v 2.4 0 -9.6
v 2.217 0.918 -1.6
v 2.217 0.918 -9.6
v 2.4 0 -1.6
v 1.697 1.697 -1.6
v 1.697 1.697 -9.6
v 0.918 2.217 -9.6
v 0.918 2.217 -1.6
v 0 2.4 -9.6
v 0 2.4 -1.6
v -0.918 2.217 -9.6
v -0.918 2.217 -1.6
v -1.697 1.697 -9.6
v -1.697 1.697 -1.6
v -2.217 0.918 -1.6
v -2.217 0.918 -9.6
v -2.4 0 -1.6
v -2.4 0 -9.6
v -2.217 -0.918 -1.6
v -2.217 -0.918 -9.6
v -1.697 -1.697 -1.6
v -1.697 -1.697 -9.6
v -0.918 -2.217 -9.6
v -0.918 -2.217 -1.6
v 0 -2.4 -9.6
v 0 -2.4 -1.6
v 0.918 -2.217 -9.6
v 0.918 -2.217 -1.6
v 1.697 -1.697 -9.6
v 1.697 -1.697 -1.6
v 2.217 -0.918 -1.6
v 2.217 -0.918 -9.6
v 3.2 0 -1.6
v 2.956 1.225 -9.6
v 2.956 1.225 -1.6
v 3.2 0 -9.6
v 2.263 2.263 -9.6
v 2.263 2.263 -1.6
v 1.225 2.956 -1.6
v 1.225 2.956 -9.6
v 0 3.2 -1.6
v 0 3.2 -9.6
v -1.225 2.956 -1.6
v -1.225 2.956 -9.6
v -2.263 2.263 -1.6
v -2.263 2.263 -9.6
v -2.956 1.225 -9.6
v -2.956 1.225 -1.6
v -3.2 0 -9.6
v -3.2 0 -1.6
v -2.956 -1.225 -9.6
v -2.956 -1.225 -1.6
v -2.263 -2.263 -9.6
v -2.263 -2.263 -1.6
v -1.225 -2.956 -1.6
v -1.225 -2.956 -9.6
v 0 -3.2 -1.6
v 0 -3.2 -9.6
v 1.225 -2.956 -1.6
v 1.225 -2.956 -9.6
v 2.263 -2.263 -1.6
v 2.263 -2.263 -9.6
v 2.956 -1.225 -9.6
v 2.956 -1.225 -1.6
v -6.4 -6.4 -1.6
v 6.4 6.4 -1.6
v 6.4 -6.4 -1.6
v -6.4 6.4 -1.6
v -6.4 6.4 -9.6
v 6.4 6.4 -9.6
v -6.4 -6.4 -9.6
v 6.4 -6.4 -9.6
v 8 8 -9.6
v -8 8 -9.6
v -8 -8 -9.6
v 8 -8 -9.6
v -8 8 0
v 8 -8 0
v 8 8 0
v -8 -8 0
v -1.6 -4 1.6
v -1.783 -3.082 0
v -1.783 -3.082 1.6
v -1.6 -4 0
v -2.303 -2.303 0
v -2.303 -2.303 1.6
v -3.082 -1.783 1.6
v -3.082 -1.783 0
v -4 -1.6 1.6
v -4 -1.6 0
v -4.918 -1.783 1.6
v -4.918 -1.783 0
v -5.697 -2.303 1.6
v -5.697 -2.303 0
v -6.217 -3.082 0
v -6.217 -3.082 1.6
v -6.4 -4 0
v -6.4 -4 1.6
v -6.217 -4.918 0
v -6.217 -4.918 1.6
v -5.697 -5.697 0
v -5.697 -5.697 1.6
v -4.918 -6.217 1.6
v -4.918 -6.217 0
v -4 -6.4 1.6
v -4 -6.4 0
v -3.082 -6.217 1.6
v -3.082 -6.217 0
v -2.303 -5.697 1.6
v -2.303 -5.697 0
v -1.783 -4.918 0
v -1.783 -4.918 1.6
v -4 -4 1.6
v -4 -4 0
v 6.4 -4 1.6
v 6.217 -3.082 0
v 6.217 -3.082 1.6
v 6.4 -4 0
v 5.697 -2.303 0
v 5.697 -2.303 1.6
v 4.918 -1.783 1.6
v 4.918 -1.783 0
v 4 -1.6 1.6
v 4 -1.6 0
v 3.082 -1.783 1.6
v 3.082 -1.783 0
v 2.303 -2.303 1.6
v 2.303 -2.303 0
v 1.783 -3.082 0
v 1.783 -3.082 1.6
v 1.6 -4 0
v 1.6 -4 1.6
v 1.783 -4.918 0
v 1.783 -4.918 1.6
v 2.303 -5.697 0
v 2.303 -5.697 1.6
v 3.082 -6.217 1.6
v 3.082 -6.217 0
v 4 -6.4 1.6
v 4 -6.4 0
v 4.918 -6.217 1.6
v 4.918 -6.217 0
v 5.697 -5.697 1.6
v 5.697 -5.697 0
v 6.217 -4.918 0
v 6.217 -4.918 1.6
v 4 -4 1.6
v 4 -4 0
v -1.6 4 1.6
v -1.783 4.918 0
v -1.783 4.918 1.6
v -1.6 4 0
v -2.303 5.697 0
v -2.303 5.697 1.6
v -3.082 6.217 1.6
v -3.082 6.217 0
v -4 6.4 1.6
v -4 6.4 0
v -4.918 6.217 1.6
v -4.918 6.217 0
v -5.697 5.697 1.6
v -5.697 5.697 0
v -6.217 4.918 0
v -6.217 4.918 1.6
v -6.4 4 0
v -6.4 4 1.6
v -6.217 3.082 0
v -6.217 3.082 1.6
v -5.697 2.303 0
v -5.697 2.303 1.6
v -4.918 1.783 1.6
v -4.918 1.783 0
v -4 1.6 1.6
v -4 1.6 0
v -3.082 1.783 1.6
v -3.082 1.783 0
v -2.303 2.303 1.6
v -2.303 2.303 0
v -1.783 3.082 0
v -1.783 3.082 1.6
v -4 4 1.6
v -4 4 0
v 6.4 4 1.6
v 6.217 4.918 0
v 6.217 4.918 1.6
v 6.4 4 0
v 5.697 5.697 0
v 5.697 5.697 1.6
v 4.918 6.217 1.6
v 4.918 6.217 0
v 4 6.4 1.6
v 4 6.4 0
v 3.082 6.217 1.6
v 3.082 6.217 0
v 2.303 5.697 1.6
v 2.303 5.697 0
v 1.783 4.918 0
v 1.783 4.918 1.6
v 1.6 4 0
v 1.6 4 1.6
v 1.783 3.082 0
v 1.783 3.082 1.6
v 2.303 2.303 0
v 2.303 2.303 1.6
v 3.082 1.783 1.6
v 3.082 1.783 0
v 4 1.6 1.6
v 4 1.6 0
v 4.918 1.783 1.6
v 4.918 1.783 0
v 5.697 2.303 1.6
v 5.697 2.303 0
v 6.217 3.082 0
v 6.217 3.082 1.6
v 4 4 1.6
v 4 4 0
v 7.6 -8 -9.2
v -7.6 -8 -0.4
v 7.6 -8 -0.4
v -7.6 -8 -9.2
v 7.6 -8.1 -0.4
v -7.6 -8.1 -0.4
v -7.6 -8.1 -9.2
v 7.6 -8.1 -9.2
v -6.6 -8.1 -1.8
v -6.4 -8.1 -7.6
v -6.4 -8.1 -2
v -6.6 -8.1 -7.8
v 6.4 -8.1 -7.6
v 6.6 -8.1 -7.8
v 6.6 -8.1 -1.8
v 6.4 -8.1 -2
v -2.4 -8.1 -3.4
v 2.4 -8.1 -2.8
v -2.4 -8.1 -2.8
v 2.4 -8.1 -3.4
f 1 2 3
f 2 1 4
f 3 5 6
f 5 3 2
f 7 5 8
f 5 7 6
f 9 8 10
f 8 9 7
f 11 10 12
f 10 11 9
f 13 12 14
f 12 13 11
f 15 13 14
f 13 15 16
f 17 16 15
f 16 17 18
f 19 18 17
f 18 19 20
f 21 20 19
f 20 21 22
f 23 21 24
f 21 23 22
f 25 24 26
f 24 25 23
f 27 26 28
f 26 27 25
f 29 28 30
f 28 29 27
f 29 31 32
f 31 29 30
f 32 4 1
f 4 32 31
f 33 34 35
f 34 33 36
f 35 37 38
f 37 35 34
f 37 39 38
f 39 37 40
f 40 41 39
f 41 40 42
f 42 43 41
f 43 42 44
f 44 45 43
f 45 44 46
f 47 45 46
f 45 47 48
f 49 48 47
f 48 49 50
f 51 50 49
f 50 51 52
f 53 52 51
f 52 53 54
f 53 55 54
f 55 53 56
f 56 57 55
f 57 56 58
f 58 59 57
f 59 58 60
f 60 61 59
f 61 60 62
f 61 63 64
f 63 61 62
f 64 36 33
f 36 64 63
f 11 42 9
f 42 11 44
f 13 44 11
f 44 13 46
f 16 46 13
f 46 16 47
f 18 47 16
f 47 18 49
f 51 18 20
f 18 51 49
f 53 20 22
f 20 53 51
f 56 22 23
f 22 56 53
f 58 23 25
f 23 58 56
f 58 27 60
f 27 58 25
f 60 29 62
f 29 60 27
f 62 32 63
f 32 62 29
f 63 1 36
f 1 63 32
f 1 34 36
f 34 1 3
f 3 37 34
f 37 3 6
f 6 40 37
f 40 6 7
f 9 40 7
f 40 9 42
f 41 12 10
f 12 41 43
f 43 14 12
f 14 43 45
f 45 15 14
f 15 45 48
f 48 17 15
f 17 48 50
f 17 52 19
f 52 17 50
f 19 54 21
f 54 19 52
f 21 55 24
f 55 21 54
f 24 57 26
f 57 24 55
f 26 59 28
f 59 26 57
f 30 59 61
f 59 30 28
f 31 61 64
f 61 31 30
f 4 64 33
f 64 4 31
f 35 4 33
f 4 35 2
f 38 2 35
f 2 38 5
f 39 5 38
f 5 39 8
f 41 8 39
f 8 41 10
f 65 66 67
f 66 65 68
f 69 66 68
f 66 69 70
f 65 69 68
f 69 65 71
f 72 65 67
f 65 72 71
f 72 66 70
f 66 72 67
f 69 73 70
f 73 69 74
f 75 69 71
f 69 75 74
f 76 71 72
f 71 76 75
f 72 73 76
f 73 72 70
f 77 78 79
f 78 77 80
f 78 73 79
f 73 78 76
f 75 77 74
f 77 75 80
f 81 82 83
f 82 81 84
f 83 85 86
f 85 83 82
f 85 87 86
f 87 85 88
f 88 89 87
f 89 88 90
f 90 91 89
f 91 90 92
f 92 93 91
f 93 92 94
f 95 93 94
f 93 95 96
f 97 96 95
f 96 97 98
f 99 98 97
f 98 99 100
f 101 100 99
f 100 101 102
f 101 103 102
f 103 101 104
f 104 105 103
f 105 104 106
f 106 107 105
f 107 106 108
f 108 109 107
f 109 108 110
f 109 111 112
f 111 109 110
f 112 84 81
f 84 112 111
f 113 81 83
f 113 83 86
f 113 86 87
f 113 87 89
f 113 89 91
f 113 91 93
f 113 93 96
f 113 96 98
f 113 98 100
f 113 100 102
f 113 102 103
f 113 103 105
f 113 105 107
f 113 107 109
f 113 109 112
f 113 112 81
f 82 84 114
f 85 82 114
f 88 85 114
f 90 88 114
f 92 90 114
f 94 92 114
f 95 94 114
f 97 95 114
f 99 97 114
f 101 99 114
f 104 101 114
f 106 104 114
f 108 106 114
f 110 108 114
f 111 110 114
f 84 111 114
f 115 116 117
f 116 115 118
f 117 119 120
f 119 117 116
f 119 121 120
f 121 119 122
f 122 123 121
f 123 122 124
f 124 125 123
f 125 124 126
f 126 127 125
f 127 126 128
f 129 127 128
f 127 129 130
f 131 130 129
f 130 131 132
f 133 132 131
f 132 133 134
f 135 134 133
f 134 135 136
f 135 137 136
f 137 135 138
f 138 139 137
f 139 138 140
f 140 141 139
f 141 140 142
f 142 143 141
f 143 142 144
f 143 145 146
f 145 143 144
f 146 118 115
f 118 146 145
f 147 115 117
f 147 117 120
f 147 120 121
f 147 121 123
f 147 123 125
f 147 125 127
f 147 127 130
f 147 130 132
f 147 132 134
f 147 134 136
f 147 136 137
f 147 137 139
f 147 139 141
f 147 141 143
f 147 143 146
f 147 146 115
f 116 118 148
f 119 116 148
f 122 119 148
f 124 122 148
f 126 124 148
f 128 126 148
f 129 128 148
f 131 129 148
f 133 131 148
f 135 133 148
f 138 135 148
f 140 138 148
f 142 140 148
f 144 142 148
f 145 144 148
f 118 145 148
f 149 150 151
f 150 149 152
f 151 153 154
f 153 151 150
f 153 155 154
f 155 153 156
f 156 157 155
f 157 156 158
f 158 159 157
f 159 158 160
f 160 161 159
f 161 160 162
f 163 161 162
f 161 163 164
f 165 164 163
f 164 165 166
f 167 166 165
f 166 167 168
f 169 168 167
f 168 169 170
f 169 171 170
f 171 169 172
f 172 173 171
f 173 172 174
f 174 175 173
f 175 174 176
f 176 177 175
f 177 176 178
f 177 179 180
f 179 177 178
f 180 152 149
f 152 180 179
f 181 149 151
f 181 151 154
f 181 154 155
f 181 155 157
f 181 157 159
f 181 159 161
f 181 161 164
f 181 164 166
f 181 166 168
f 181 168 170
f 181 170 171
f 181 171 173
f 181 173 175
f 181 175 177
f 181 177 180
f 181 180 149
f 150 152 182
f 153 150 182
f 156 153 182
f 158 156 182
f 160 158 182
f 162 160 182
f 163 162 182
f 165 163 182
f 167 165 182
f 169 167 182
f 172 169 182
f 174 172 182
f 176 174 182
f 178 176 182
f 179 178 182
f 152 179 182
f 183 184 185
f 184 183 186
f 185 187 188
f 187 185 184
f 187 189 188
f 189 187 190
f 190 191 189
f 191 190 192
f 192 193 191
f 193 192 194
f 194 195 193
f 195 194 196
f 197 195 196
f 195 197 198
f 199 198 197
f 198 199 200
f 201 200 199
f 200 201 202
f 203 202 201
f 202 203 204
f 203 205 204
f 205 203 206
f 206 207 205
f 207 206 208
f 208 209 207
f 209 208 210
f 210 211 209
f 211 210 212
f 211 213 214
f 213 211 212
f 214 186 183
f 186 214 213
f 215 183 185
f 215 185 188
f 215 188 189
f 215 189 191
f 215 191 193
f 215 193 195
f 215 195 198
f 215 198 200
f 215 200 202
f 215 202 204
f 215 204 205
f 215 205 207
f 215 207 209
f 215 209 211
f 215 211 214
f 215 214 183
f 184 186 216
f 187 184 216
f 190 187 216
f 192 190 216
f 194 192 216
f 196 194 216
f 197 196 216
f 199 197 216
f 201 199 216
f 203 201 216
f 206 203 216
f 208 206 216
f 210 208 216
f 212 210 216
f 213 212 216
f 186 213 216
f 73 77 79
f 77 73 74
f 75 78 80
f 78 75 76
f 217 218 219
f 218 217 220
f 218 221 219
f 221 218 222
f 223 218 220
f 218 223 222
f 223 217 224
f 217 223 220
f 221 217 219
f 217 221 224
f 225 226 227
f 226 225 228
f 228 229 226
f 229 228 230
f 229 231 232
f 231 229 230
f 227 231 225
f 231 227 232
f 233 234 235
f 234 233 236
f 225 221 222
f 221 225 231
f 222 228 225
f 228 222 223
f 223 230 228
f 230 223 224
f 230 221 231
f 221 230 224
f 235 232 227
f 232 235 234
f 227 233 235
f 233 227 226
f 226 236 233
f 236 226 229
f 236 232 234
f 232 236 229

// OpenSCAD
// file: ../p/4-4disc.scad
use <../lib.scad>
function ldraw_lib__4_4disc() = [
// 0 Disc 1.0
// 0 Name: 4-4disc.dat
// 0 Author: James Jessiman
// 0 !LDRAW_ORG Primitive UPDATE 2002-02
// 0 !LICENSE Licensed under CC BY 2.0 and CC BY 4.0 : see CAreadme.txt
// 
// 0 BFC CERTIFY CCW
  [0,"BFC","CERTIFY"],
  [0,"BFC","CCW"],
// 
// 0 !HISTORY 1998-12-15 [PTadmin] Official Update 1998-10
// 0 !HISTORY 2002-03-23 [sbliss] Added BFC statement
// 0 !HISTORY 2002-04-25 [PTadmin] Official Update 2002-02
// 0 !HISTORY 2007-06-24 [PTadmin] Header formatted for Contributor Agreement
// 0 !HISTORY 2008-07-01 [PTadmin] Official Update 2008-01
// 
// 
// 3 16 0 0 0 1 0 0 0.9239 0 0.3827
  [3,16,0,0,0,1,0,0,0.9239,0,0.3827],
// 3 16 0 0 0 0.9239 0 0.3827 0.7071 0 0.7071
  [3,16,0,0,0,0.9239,0,0.3827,0.7071,0,0.7071],
// 3 16 0 0 0 0.7071 0 0.7071 0.3827 0 0.9239
  [3,16,0,0,0,0.7071,0,0.7071,0.3827,0,0.9239],
// 3 16 0 0 0 0.3827 0 0.9239 0 0 1
  [3,16,0,0,0,0.3827,0,0.9239,0,0,1],
// 3 16 0 0 0 0 0 1 -0.3827 0 0.9239
  [3,16,0,0,0,0,0,1,-0.3827,0,0.9239],
// 3 16 0 0 0 -0.3827 0 0.9239 -0.7071 0 0.7071
  [3,16,0,0,0,-0.3827,0,0.9239,-0.7071,0,0.7071],
// 3 16 0 0 0 -0.7071 0 0.7071 -0.9239 0 0.3827
  [3,16,0,0,0,-0.7071,0,0.7071,-0.9239,0,0.3827],
// 3 16 0 0 0 -0.9239 0 0.3827 -1 0 -0
  [3,16,0,0,0,-0.9239,0,0.3827,-1,0,-0],
// 3 16 0 0 0 -1 0 -0 -0.9239 0 -0.3827
  [3,16,0,0,0,-1,0,-0,-0.9239,0,-0.3827],
// 3 16 0 0 0 -0.9239 0 -0.3827 -0.7071 0 -0.7071
  [3,16,0,0,0,-0.9239,0,-0.3827,-0.7071,0,-0.7071],
// 3 16 0 0 0 -0.7071 0 -0.7071 -0.3827 0 -0.9239
  [3,16,0,0,0,-0.7071,0,-0.7071,-0.3827,0,-0.9239],
// 3 16 0 0 0 -0.3827 0 -0.9239 0 0 -1
  [3,16,0,0,0,-0.3827,0,-0.9239,0,0,-1],
// 3 16 0 0 0 0 0 -1 0.3827 0 -0.9239
  [3,16,0,0,0,0,0,-1,0.3827,0,-0.9239],
// 3 16 0 0 0 0.3827 0 -0.9239 0.7071 0 -0.7071
  [3,16,0,0,0,0.3827,0,-0.9239,0.7071,0,-0.7071],
// 3 16 0 0 0 0.7071 0 -0.7071 0.9239 0 -0.3827
  [3,16,0,0,0,0.7071,0,-0.7071,0.9239,0,-0.3827],
// 3 16 0 0 0 0.9239 0 -0.3827 1 0 0
  [3,16,0,0,0,0.9239,0,-0.3827,1,0,0],
// 0
];
module ldraw_lib__4_4disc(step=0, col=false, unit=2/5, alt=false, line=0.2, solid=!$preview)
    makepoly(ldraw_lib__4_4disc(), step=step, col=col, unit=unit, alt=alt, line=line, solid=solid);
ldraw_lib__4_4disc(line=0.2);
// file: ../p/stud.scad
use <../lib.scad>
use <4-4cyli.scad>
use <4-4disc.scad>
use <4-4edge.scad>
function ldraw_lib__stud() = [
// 0 Stud
// 0 Name: stud.dat
// 0 Author: James Jessiman
// 0 !LDRAW_ORG Primitive UPDATE 2012-01
// 0 !LICENSE Licensed under CC BY 4.0 : see CAreadme.txt
// 
// 0 BFC CERTIFY CCW
  [0,"BFC","CERTIFY"],
  [0,"BFC","CCW"],
// 
// 0 !HISTORY 2002-04-04 [sbliss] Modified for BFC compliance
// 0 !HISTORY 2002-04-25 [PTadmin] Official Update 2002-02
// 0 !HISTORY 2007-06-24 [PTadmin] Header formatted for Contributor Agreement
// 0 !HISTORY 2008-07-01 [PTadmin] Official Update 2008-01
// 0 !HISTORY 2012-02-16 [Philo] Changed to CCW
// 0 !HISTORY 2012-03-30 [PTadmin] Official Update 2012-01
// 
// 
// 1 16 0 0 0 6 0 0 0 1 0 0 0 6 4-4edge.dat
  [1,16,0,0,0,6,0,0,0,1,0,0,0,6, ldraw_lib__4_4edge()],
// 1 16 0 -4 0 6 0 0 0 1 0 0 0 6 4-4edge.dat
  [1,16,0,-4,0,6,0,0,0,1,0,0,0,6, ldraw_lib__4_4edge()],
// 1 16 0 0 0 6 0 0 0 -4 0 0 0 6 4-4cyli.dat
  [1,16,0,0,0,6,0,0,0,-4,0,0,0,6, ldraw_lib__4_4cyli()],
// 1 16 0 -4 0 6 0 0 0 1 0 0 0 6 4-4disc.dat
  [1,16,0,-4,0,6,0,0,0,1,0,0,0,6, ldraw_lib__4_4disc()],
  [-1,16,0,0,0,6,0,0,0,-1,0,0,0,6, ldraw_lib__4_4disc()],
];
module ldraw_lib__stud(step=0, col=false, unit=2/5, alt=false, line=0.2, solid=!$preview)
    makepoly(ldraw_lib__stud(), step=step, col=col, unit=unit, alt=alt, line=line, solid=solid);
ldraw_lib__stud(line=0.2);
// file: ../p/4-4ring3.scad
use <../lib.scad>
$fa=1; $fs=0.2;
function ldraw_lib__4_4ring3(realsolid=false) = [
// 0 Ring  3 x 1.0
// 0 Name: 4-4ring3.dat
// 0 Author: James Jessiman
// 0 !LDRAW_ORG Primitive UPDATE 2009-01
// 0 !LICENSE Licensed under CC BY 2.0 and CC BY 4.0 : see CAreadme.txt
// 
// 0 BFC CERTIFY CCW
  [0,"BFC","CERTIFY"],
  [0,"BFC","CCW"],
// 
// 0 !HISTORY 1998-12-15 [PTadmin] Official Update 1998-10
// 0 !HISTORY 2002-04-05 [hafhead] Added BFC statement
// 0 !HISTORY 2002-04-25 [PTadmin] Official Update 2002-02
// 0 !HISTORY 2007-06-24 [PTadmin] Header formatted for Contributor Agreement
// 0 !HISTORY 2008-07-01 [PTadmin] Official Update 2008-01
// 0 !HISTORY 2008-08-26 [cwdee] Switch polygon winding and rename
// 0 !HISTORY 2009-05-02 [PTadmin] Official Update 2009-01
// 
// 
// 4 16 -1.5308 0 3.6956 -1.1481 0 2.7717 0 0 3 0 0 4
  [4,16,-1.5308,0,3.6956,-1.1481,0,2.7717,0,0,3,0,0,4],
// 4 16 -2.8284 0 2.8284 -2.1213 0 2.1213 -1.1481 0 2.7717 -1.5308 0 3.6956
  [4,16,-2.8284,0,2.8284,-2.1213,0,2.1213,-1.1481,0,2.7717,-1.5308,0,3.6956],
// 4 16 -3.6956 0 1.5308 -2.7717 0 1.1481 -2.1213 0 2.1213 -2.8284 0 2.8284
  [4,16,-3.6956,0,1.5308,-2.7717,0,1.1481,-2.1213,0,2.1213,-2.8284,0,2.8284],
// 4 16 -4 0 0 -3 0 0 -2.7717 0 1.1481 -3.6956 0 1.5308
  [4,16,-4,0,0,-3,0,0,-2.7717,0,1.1481,-3.6956,0,1.5308],
// 4 16 -3.6956 0 -1.5308 -2.7717 0 -1.1481 -3 0 0 -4 0 0
  [4,16,-3.6956,0,-1.5308,-2.7717,0,-1.1481,-3,0,0,-4,0,0],
// 4 16 -2.8284 0 -2.8284 -2.1213 0 -2.1213 -2.7717 0 -1.1481 -3.6956 0 -1.5308
  [4,16,-2.8284,0,-2.8284,-2.1213,0,-2.1213,-2.7717,0,-1.1481,-3.6956,0,-1.5308],
// 4 16 -1.5308 0 -3.6956 -1.1481 0 -2.7717 -2.1213 0 -2.1213 -2.8284 0 -2.8284
  [4,16,-1.5308,0,-3.6956,-1.1481,0,-2.7717,-2.1213,0,-2.1213,-2.8284,0,-2.8284],
// 4 16 0 0 -4 0 0 -3 -1.1481 0 -2.7717 -1.5308 0 -3.6956
  [4,16,0,0,-4,0,0,-3,-1.1481,0,-2.7717,-1.5308,0,-3.6956],
// 4 16 1.5308 0 -3.6956 1.1481 0 -2.7717 0 0 -3 0 0 -4
  [4,16,1.5308,0,-3.6956,1.1481,0,-2.7717,0,0,-3,0,0,-4],
// 4 16 2.8284 0 -2.8284 2.1213 0 -2.1213 1.1481 0 -2.7717 1.5308 0 -3.6956
  [4,16,2.8284,0,-2.8284,2.1213,0,-2.1213,1.1481,0,-2.7717,1.5308,0,-3.6956],
// 4 16 3.6956 0 -1.5308 2.7717 0 -1.1481 2.1213 0 -2.1213 2.8284 0 -2.8284
  [4,16,3.6956,0,-1.5308,2.7717,0,-1.1481,2.1213,0,-2.1213,2.8284,0,-2.8284],
// 4 16 4 0 0 3 0 0 2.7717 0 -1.1481 3.6956 0 -1.5308
  [4,16,4,0,0,3,0,0,2.7717,0,-1.1481,3.6956,0,-1.5308],
// 4 16 3.6956 0 1.5308 2.7717 0 1.1481 3 0 0 4 0 0
  [4,16,3.6956,0,1.5308,2.7717,0,1.1481,3,0,0,4,0,0],
// 4 16 2.8284 0 2.8284 2.1213 0 2.1213 2.7717 0 1.1481 3.6956 0 1.5308
  [4,16,2.8284,0,2.8284,2.1213,0,2.1213,2.7717,0,1.1481,3.6956,0,1.5308],
// 4 16 1.5308 0 3.6956 1.1481 0 2.7717 2.1213 0 2.1213 2.8284 0 2.8284
  [4,16,1.5308,0,3.6956,1.1481,0,2.7717,2.1213,0,2.1213,2.8284,0,2.8284],
// 4 16 0 0 4 0 0 3 1.1481 0 2.7717 1.5308 0 3.6956
  [4,16,0,0,4,0,0,3,1.1481,0,2.7717,1.5308,0,3.6956],
// 0
];
module ldraw_lib__4_4ring3(step=0, col=false, unit=2/5, alt=false, line=0.2, solid=!$preview)
    makepoly(ldraw_lib__4_4ring3(solid), step=step, col=col, unit=unit, alt=alt, line=line, solid=solid);
ldraw_lib__4_4ring3(line=0.2);
// file: ../p/4-4edge.scad
use <../lib.scad>
function ldraw_lib__4_4edge() = [
// 0 Circle 1.0
// 0 Name: 4-4edge.dat
// 0 Author: James Jessiman
// 0 !LDRAW_ORG Primitive UPDATE 2017-01
// 0 !LICENSE Licensed under CC BY 2.0 and CC BY 4.0 : see CAreadme.txt
// 
// 0 BFC CERTIFY CCW
  [0,"BFC","CERTIFY"],
  [0,"BFC","CCW"],
// 
// 0 !HISTORY 1998-12-15 [PTadmin] Official Update 1998-10
// 0 !HISTORY 2005-12-28 [PTadmin] Official Update 2005-01
// 0 !HISTORY 2007-06-24 [PTadmin] Header formatted for Contributor Agreement
// 0 !HISTORY 2008-07-01 [PTadmin] Official Update 2008-01
// 0 !HISTORY 2017-01-15 [Steffen] BFCed
// 0 !HISTORY 2017-12-30 [PTadmin] Official Update 2017-01
// 
// 
// 2 24 1 0 0 0.9239 0 0.3827
  [2,24,1,0,0,0.9239,0,0.3827],
// 2 24 0.9239 0 0.3827 0.7071 0 0.7071
  [2,24,0.9239,0,0.3827,0.7071,0,0.7071],
// 2 24 0.7071 0 0.7071 0.3827 0 0.9239
  [2,24,0.7071,0,0.7071,0.3827,0,0.9239],
// 2 24 0.3827 0 0.9239 0 0 1
  [2,24,0.3827,0,0.9239,0,0,1],
// 2 24 0 0 1 -0.3827 0 0.9239
  [2,24,0,0,1,-0.3827,0,0.9239],
// 2 24 -0.3827 0 0.9239 -0.7071 0 0.7071
  [2,24,-0.3827,0,0.9239,-0.7071,0,0.7071],
// 2 24 -0.7071 0 0.7071 -0.9239 0 0.3827
  [2,24,-0.7071,0,0.7071,-0.9239,0,0.3827],
// 2 24 -0.9239 0 0.3827 -1 0 -0
  [2,24,-0.9239,0,0.3827,-1,0,-0],
// 2 24 -1 0 -0 -0.9239 0 -0.3827
  [2,24,-1,0,-0,-0.9239,0,-0.3827],
// 2 24 -0.9239 0 -0.3827 -0.7071 0 -0.7071
  [2,24,-0.9239,0,-0.3827,-0.7071,0,-0.7071],
// 2 24 -0.7071 0 -0.7071 -0.3827 0 -0.9239
  [2,24,-0.7071,0,-0.7071,-0.3827,0,-0.9239],
// 2 24 -0.3827 0 -0.9239 0 0 -1
  [2,24,-0.3827,0,-0.9239,0,0,-1],
// 2 24 0 0 -1 0.3827 0 -0.9239
  [2,24,0,0,-1,0.3827,0,-0.9239],
// 2 24 0.3827 0 -0.9239 0.7071 0 -0.7071
  [2,24,0.3827,0,-0.9239,0.7071,0,-0.7071],
// 2 24 0.7071 0 -0.7071 0.9239 0 -0.3827
  [2,24,0.7071,0,-0.7071,0.9239,0,-0.3827],
// 2 24 0.9239 0 -0.3827 1 0 0
  [2,24,0.9239,0,-0.3827,1,0,0],
];
module ldraw_lib__4_4edge(step=0, col=false, unit=2/5, alt=false, line=0.2, solid=!$preview)
    makepoly(ldraw_lib__4_4edge(), step=step, col=col, unit=unit, alt=alt, line=line, solid=solid);
ldraw_lib__4_4edge(line=0.2);
// file: ../p/4-4cyli.scad
use <../lib.scad>
$fa=1; $fs=0.2;
function ldraw_lib__4_4cyli(realsolid=false) = [
// 0 Cylinder 1.0
// 0 Name: 4-4cyli.dat
// 0 Author: James Jessiman
// 0 !LDRAW_ORG Primitive UPDATE 2005-01
// 0 !LICENSE Licensed under CC BY 2.0 and CC BY 4.0 : see CAreadme.txt
// 
// 0 BFC CERTIFY CCW
  [0,"BFC","CERTIFY"],
  [0,"BFC","CCW"],
// 
// 0 !HISTORY 1998-12-15 [PTadmin] Official Update 1998-10
// 0 !HISTORY 2002-03-23 [sbliss] Added BFC statement; merged headers from files in distributions LDraw 0.27 and Complete.
// 0 !HISTORY 2002-04-25 [PTadmin] Official Update 2002-02
// 0 !HISTORY 2004-12-14 [guyvivan] BFC CCW
// 0 !HISTORY 2005-12-28 [PTadmin] Official Update 2005-01
// 0 !HISTORY 2007-06-24 [PTadmin] Header formatted for Contributor Agreement
// 0 !HISTORY 2008-07-01 [PTadmin] Official Update 2008-01
// 
// 
// 4 16 1 1 0 0.9239 1 0.3827 0.9239 0 0.3827 1 0 0
  [4,16,1,1,0,0.9239,1,0.3827,0.9239,0,0.3827,1,0,0],
// 5 24 1 0 0 1 1 0 0.9239 0 0.3827 0.9239 0 -0.3827
  [5,24,1,0,0,1,1,0,0.9239,0,0.3827,0.9239,0,-0.3827],
// 4 16 0.9239 1 0.3827 0.7071 1 0.7071 0.7071 0 0.7071 0.9239 0 0.3827
  [4,16,0.9239,1,0.3827,0.7071,1,0.7071,0.7071,0,0.7071,0.9239,0,0.3827],
// 5 24 0.9239 0 0.3827 0.9239 1 0.3827 0.7071 0 0.7071 1 0 0
  [5,24,0.9239,0,0.3827,0.9239,1,0.3827,0.7071,0,0.7071,1,0,0],
// 4 16 0.7071 1 0.7071 0.3827 1 0.9239 0.3827 0 0.9239 0.7071 0 0.7071
  [4,16,0.7071,1,0.7071,0.3827,1,0.9239,0.3827,0,0.9239,0.7071,0,0.7071],
// 5 24 0.7071 0 0.7071 0.7071 1 0.7071 0.3827 0 0.9239 0.9239 0 0.3827
  [5,24,0.7071,0,0.7071,0.7071,1,0.7071,0.3827,0,0.9239,0.9239,0,0.3827],
// 4 16 0.3827 1 0.9239 0 1 1 0 0 1 0.3827 0 0.9239
  [4,16,0.3827,1,0.9239,0,1,1,0,0,1,0.3827,0,0.9239],
// 5 24 0.3827 0 0.9239 0.3827 1 0.9239 0 0 1 0.7071 0 0.7071
  [5,24,0.3827,0,0.9239,0.3827,1,0.9239,0,0,1,0.7071,0,0.7071],
// 4 16 0 1 1 -0.3827 1 0.9239 -0.3827 0 0.9239 0 0 1
  [4,16,0,1,1,-0.3827,1,0.9239,-0.3827,0,0.9239,0,0,1],
// 5 24 0 0 1 0 1 1 -0.3827 0 0.9239 0.3827 0 0.9239
  [5,24,0,0,1,0,1,1,-0.3827,0,0.9239,0.3827,0,0.9239],
// 4 16 -0.3827 1 0.9239 -0.7071 1 0.7071 -0.7071 0 0.7071 -0.3827 0 0.9239
  [4,16,-0.3827,1,0.9239,-0.7071,1,0.7071,-0.7071,0,0.7071,-0.3827,0,0.9239],
// 5 24 -0.3827 0 0.9239 -0.3827 1 0.9239 -0.7071 0 0.7071 0 0 1
  [5,24,-0.3827,0,0.9239,-0.3827,1,0.9239,-0.7071,0,0.7071,0,0,1],
// 4 16 -0.7071 1 0.7071 -0.9239 1 0.3827 -0.9239 0 0.3827 -0.7071 0 0.7071
  [4,16,-0.7071,1,0.7071,-0.9239,1,0.3827,-0.9239,0,0.3827,-0.7071,0,0.7071],
// 5 24 -0.7071 0 0.7071 -0.7071 1 0.7071 -0.9239 0 0.3827 -0.3827 0 0.9239
  [5,24,-0.7071,0,0.7071,-0.7071,1,0.7071,-0.9239,0,0.3827,-0.3827,0,0.9239],
// 4 16 -0.9239 1 0.3827 -1 1 0 -1 0 0 -0.9239 0 0.3827
  [4,16,-0.9239,1,0.3827,-1,1,0,-1,0,0,-0.9239,0,0.3827],
// 5 24 -0.9239 0 0.3827 -0.9239 1 0.3827 -1 0 0 -0.7071 0 0.7071
  [5,24,-0.9239,0,0.3827,-0.9239,1,0.3827,-1,0,0,-0.7071,0,0.7071],
// 4 16 -1 1 0 -0.9239 1 -0.3827 -0.9239 0 -0.3827 -1 0 0
  [4,16,-1,1,0,-0.9239,1,-0.3827,-0.9239,0,-0.3827,-1,0,0],
// 5 24 -1 0 0 -1 1 0 -0.9239 0 -0.3827 -0.9239 0 0.3827
  [5,24,-1,0,0,-1,1,0,-0.9239,0,-0.3827,-0.9239,0,0.3827],
// 4 16 -0.9239 1 -0.3827 -0.7071 1 -0.7071 -0.7071 0 -0.7071 -0.9239 0 -0.3827
  [4,16,-0.9239,1,-0.3827,-0.7071,1,-0.7071,-0.7071,0,-0.7071,-0.9239,0,-0.3827],
// 5 24 -0.9239 0 -0.3827 -0.9239 1 -0.3827 -0.7071 0 -0.7071 -1 0 0
  [5,24,-0.9239,0,-0.3827,-0.9239,1,-0.3827,-0.7071,0,-0.7071,-1,0,0],
// 4 16 -0.7071 1 -0.7071 -0.3827 1 -0.9239 -0.3827 0 -0.9239 -0.7071 0 -0.7071
  [4,16,-0.7071,1,-0.7071,-0.3827,1,-0.9239,-0.3827,0,-0.9239,-0.7071,0,-0.7071],
// 5 24 -0.7071 0 -0.7071 -0.7071 1 -0.7071 -0.3827 0 -0.9239 -0.9239 0 -0.3827
  [5,24,-0.7071,0,-0.7071,-0.7071,1,-0.7071,-0.3827,0,-0.9239,-0.9239,0,-0.3827],
// 4 16 -0.3827 1 -0.9239 0 1 -1 0 0 -1 -0.3827 0 -0.9239
  [4,16,-0.3827,1,-0.9239,0,1,-1,0,0,-1,-0.3827,0,-0.9239],
// 5 24 -0.3827 0 -0.9239 -0.3827 1 -0.9239 0 0 -1 -0.7071 0 -0.7071
  [5,24,-0.3827,0,-0.9239,-0.3827,1,-0.9239,0,0,-1,-0.7071,0,-0.7071],
// 4 16 0 1 -1 0.3827 1 -0.9239 0.3827 0 -0.9239 0 0 -1
  [4,16,0,1,-1,0.3827,1,-0.9239,0.3827,0,-0.9239,0,0,-1],
// 5 24 0 0 -1 0 1 -1 0.3827 0 -0.9239 -0.3827 0 -0.9239
  [5,24,0,0,-1,0,1,-1,0.3827,0,-0.9239,-0.3827,0,-0.9239],
// 4 16 0.3827 1 -0.9239 0.7071 1 -0.7071 0.7071 0 -0.7071 0.3827 0 -0.9239
  [4,16,0.3827,1,-0.9239,0.7071,1,-0.7071,0.7071,0,-0.7071,0.3827,0,-0.9239],
// 5 24 0.3827 0 -0.9239 0.3827 1 -0.9239 0.7071 0 -0.7071 0 0 -1
  [5,24,0.3827,0,-0.9239,0.3827,1,-0.9239,0.7071,0,-0.7071,0,0,-1],
// 4 16 0.7071 1 -0.7071 0.9239 1 -0.3827 0.9239 0 -0.3827 0.7071 0 -0.7071
  [4,16,0.7071,1,-0.7071,0.9239,1,-0.3827,0.9239,0,-0.3827,0.7071,0,-0.7071],
// 5 24 0.7071 0 -0.7071 0.7071 1 -0.7071 0.9239 0 -0.3827 0.3827 0 -0.9239
  [5,24,0.7071,0,-0.7071,0.7071,1,-0.7071,0.9239,0,-0.3827,0.3827,0,-0.9239],
// 4 16 0.9239 1 -0.3827 1 1 0 1 0 0 0.9239 0 -0.3827
  [4,16,0.9239,1,-0.3827,1,1,0,1,0,0,0.9239,0,-0.3827],
// 5 24 0.9239 0 -0.3827 0.9239 1 -0.3827 1 0 0 0.7071 0 -0.7071
  [5,24,0.9239,0,-0.3827,0.9239,1,-0.3827,1,0,0,0.7071,0,-0.7071],
// 0
];
module ldraw_lib__4_4cyli(step=0, col=false, unit=2/5, alt=false, line=0.2, solid=!$preview)
    makepoly(ldraw_lib__4_4cyli(solid), step=step, col=col, unit=unit, alt=alt, line=line, solid=solid);
ldraw_lib__4_4cyli(line=0.2);
// file: ../p/stug-2x2.scad
use <../lib.scad>
use <stud.scad>
function ldraw_lib__stug_2x2() = [
// 0 Stud Group  2 x  2
// 0 Name: stug-2x2.dat
// 0 Author: Steffen [Steffen]
// 0 !LDRAW_ORG Primitive UPDATE 2012-01
// 0 !LICENSE Licensed under CC BY 2.0 and CC BY 4.0 : see CAreadme.txt
// 
// 0 BFC CERTIFY CCW
  [0,"BFC","CERTIFY"],
  [0,"BFC","CCW"],
// 
// 0 !HISTORY 2005-12-28 [PTadmin] Official Update 2005-01
// 0 !HISTORY 2007-05-04 [PTadmin] Header formatted for Contributor Agreement
// 0 !HISTORY 2008-07-01 [PTadmin] Official Update 2008-01
// 0 !HISTORY 2011-07-01 [PTadmin] Renamed from stug2
// 0 !HISTORY 2011-07-25 [PTadmin] Official Update 2011-01
// 0 !HISTORY 2012-02-16 [Philo] Changed to CCW
// 0 !HISTORY 2012-03-30 [PTadmin] Official Update 2012-01
// 
// 
// 1 16 -10 0 -10 1 0 0 0 1 0 0 0 1 stud.dat
  [1,16,-10,0,-10,1,0,0,0,1,0,0,0,1, ldraw_lib__stud()],
// 1 16 10 0 -10 1 0 0 0 1 0 0 0 1 stud.dat
  [1,16,10,0,-10,1,0,0,0,1,0,0,0,1, ldraw_lib__stud()],
// 1 16 -10 0 10 1 0 0 0 1 0 0 0 1 stud.dat
  [1,16,-10,0,10,1,0,0,0,1,0,0,0,1, ldraw_lib__stud()],
// 1 16 10 0 10 1 0 0 0 1 0 0 0 1 stud.dat
  [1,16,10,0,10,1,0,0,0,1,0,0,0,1, ldraw_lib__stud()],
];
module ldraw_lib__stug_2x2(step=0, col=false, unit=2/5, alt=false, line=0.2, solid=!$preview)
    makepoly(ldraw_lib__stug_2x2(), step=step, col=col, unit=unit, alt=alt, line=line, solid=solid);
ldraw_lib__stug_2x2(line=0.2);
// file: ../p/stud4.scad
use <../lib.scad>
use <4-4cyli.scad>
use <4-4edge.scad>
use <4-4ring3.scad>
function ldraw_lib__stud4() = [
// 0 Stud Tube Open
// 0 Name: stud4.dat
// 0 Author: James Jessiman
// 0 !LDRAW_ORG Primitive UPDATE 2009-02
// 0 !LICENSE Licensed under CC BY 4.0 : see CAreadme.txt
// 
// 0 BFC CERTIFY CCW
  [0,"BFC","CERTIFY"],
  [0,"BFC","CCW"],
// 
// 0 !HISTORY 1999-07-05 [PTadmin] Official Update 1999-05
// 0 !HISTORY 2002-04-04 [sbliss] Modified for BFC compliance
// 0 !HISTORY 2002-04-25 [PTadmin] Official Update 2002-02
// 0 !HISTORY 2007-06-24 [PTadmin] Header formatted for Contributor Agreement
// 0 !HISTORY 2008-07-01 [PTadmin] Official Update 2008-01
// 0 !HISTORY 2009-06-21 [cwdee] Update ring references to 4-4ring
// 0 !HISTORY 2009-09-03 [PTadmin] Official Update 2009-02
// 
// 
// 1 16 0 -4 0 6 0 0 0 1 0 0 0 6 4-4edge.dat
  [1,16,0,-4,0,6,0,0,0,1,0,0,0,6, ldraw_lib__4_4edge()],
// 1 16 0 -4 0 8 0 0 0 1 0 0 0 8 4-4edge.dat
  [1,16,0,-4,0,8,0,0,0,1,0,0,0,8, ldraw_lib__4_4edge()],
// 1 16 0 0 0 6 0 0 0 1 0 0 0 6 4-4edge.dat
  [1,16,0,0,0,6,0,0,0,1,0,0,0,6, ldraw_lib__4_4edge()],
// 1 16 0 0 0 8 0 0 0 1 0 0 0 8 4-4edge.dat
  [1,16,0,0,0,8,0,0,0,1,0,0,0,8, ldraw_lib__4_4edge()],
// 0 BFC INVERTNEXT
  [0,"BFC","INVERTNEXT"],
// 1 16 0 -4 0 6 0 0 0 4 0 0 0 6 4-4cyli.dat
  [1,16,0,-4,0,6,0,0,0,4,0,0,0,6, ldraw_lib__4_4cyli()],
// 1 16 0 -4 0 8 0 0 0 4 0 0 0 8 4-4cyli.dat
  [1,16,0,-4,0,8,0,0,0,4,0,0,0,8, ldraw_lib__4_4cyli()],
// 1 16 0 -4 0 2 0 0 0 1 0 0 0 2 4-4ring3.dat
  [1,16,0,-4,0,2,0,0,0,1,0,0,0,2, ldraw_lib__4_4ring3()],
  [-1,16,0,0,0,2,0,0,0,-1,0,0,0,2, ldraw_lib__4_4ring3()],
// 0
];
module ldraw_lib__stud4(step=0, col=false, unit=2/5, alt=false, line=0.2, solid=!$preview)
    makepoly(ldraw_lib__stud4(), step=step, col=col, unit=unit, alt=alt, line=line, solid=solid);
ldraw_lib__stud4(line=0.2);
// file: ../p/box5.scad
use <../lib.scad>
function ldraw_lib__box5() = [
// 0 Box with 5 Faces and All Edges
// 0 Name: box5.dat
// 0 Author: James Jessiman
// 0 !LDRAW_ORG Primitive UPDATE 2012-01
// 0 !LICENSE Licensed under CC BY 2.0 and CC BY 4.0 : see CAreadme.txt
// 
// 0 BFC CERTIFY CCW
  [0,"BFC","CERTIFY"],
  [0,"BFC","CCW"],
// 
// 0 !HISTORY 2002-04-03 [sbliss] Modified for BFC compliance
// 0 !HISTORY 2002-04-25 [PTadmin] Official Update 2002-02
// 0 !HISTORY 2007-06-24 [PTadmin] Header formatted for Contributor Agreement
// 0 !HISTORY 2008-07-01 [PTadmin] Official Update 2008-01
// 0 !HISTORY 2012-02-16 [Philo] Changed to CCW
// 0 !HISTORY 2012-03-30 [PTadmin] Official Update 2012-01
// 
// 
// 2 24 1 1 1 -1 1 1
  [2,24,1,1,1,-1,1,1],
// 2 24 -1 1 1 -1 1 -1
  [2,24,-1,1,1,-1,1,-1],
// 2 24 -1 1 -1 1 1 -1
  [2,24,-1,1,-1,1,1,-1],
// 2 24 1 1 -1 1 1 1
  [2,24,1,1,-1,1,1,1],
// 2 24 1 0 1 -1 0 1
  [2,24,1,0,1,-1,0,1],
// 2 24 -1 0 1 -1 0 -1
  [2,24,-1,0,1,-1,0,-1],
// 2 24 -1 0 -1 1 0 -1
  [2,24,-1,0,-1,1,0,-1],
// 2 24 1 0 -1 1 0 1
  [2,24,1,0,-1,1,0,1],
// 2 24 1 0 1 1 1 1
  [2,24,1,0,1,1,1,1],
// 2 24 -1 0 1 -1 1 1
  [2,24,-1,0,1,-1,1,1],
// 2 24 1 0 -1 1 1 -1
  [2,24,1,0,-1,1,1,-1],
// 2 24 -1 0 -1 -1 1 -1
  [2,24,-1,0,-1,-1,1,-1],
// 4 16 -1 1 1 1 1 1 1 1 -1 -1 1 -1
  [4,16,-1,1,1,1,1,1,1,1,-1,-1,1,-1],
// 4 16 -1 1 1 -1 0 1 1 0 1 1 1 1
  [4,16,-1,1,1,-1,0,1,1,0,1,1,1,1],
// 4 16 -1 1 -1 -1 0 -1 -1 0 1 -1 1 1
  [4,16,-1,1,-1,-1,0,-1,-1,0,1,-1,1,1],
// 4 16 1 1 -1 1 0 -1 -1 0 -1 -1 1 -1
  [4,16,1,1,-1,1,0,-1,-1,0,-1,-1,1,-1],
// 4 16 1 1 1 1 0 1 1 0 -1 1 1 -1
  [4,16,1,1,1,1,0,1,1,0,-1,1,1,-1],
];
makepoly(ldraw_lib__box5(), line=0.2);
// file: ../p/box3u2p.scad
use <../lib.scad>
function ldraw_lib__box3u2p() = [
// 0 Box with 3 Faces without 2 Parallel Edges
// 0 Name: box3u2p.dat
// 0 Author: Niels Karsdorp [nielsk]
// 0 !LDRAW_ORG Primitive UPDATE 2012-01
// 0 !LICENSE Licensed under CC BY 2.0 and CC BY 4.0 : see CAreadme.txt
// 
// 0 BFC CERTIFY CCW
  [0,"BFC","CERTIFY"],
  [0,"BFC","CCW"],
// 
// 0 !HISTORY 2003-03-12 [PTadmin] Official Update 2003-01
// 0 !HISTORY 2007-06-24 [PTadmin] Header formatted for Contributor Agreement
// 0 !HISTORY 2008-07-01 [PTadmin] Official Update 2008-01
// 0 !HISTORY 2012-02-16 [Philo] Changed to CCW
// 0 !HISTORY 2012-03-30 [PTadmin] Official Update 2012-01
// 
// 
// 2 24 1 1 1 -1 1 1
  [2,24,1,1,1,-1,1,1],
// 2 24 -1 1 -1 1 1 -1
  [2,24,-1,1,-1,1,1,-1],
// 2 24 1 0 1 -1 0 1
  [2,24,1,0,1,-1,0,1],
// 2 24 -1 0 -1 1 0 -1
  [2,24,-1,0,-1,1,0,-1],
// 2 24 1 1 1 1 1 -1
  [2,24,1,1,1,1,1,-1],
// 2 24 -1 1 1 -1 1 -1
  [2,24,-1,1,1,-1,1,-1],
// 2 24 1 1 1 1 0 1
  [2,24,1,1,1,1,0,1],
// 2 24 1 1 -1 1 0 -1
  [2,24,1,1,-1,1,0,-1],
// 2 24 -1 1 1 -1 0 1
  [2,24,-1,1,1,-1,0,1],
// 2 24 -1 1 -1 -1 0 -1
  [2,24,-1,1,-1,-1,0,-1],
// 4 16 -1 1 -1 -1 1 1 1 1 1 1 1 -1
  [4,16,-1,1,-1,-1,1,1,1,1,1,1,1,-1],
// 4 16 -1 1 1 -1 0 1 1 0 1 1 1 1
  [4,16,-1,1,1,-1,0,1,1,0,1,1,1,1],
// 4 16 1 1 -1 1 0 -1 -1 0 -1 -1 1 -1
  [4,16,1,1,-1,1,0,-1,-1,0,-1,-1,1,-1],
];
module ldraw_lib__box3u2p(step=0, col=false, unit=2/5, alt=false, line=0.2, solid=!$preview)
    makepoly(ldraw_lib__box3u2p(), step=step, col=col, unit=unit, alt=alt, line=line, solid=solid);
ldraw_lib__box3u2p(line=0.2);
// file: s/3003s02.scad
use <../../lib.scad>
use <../../p/box3u2p.scad>
use <../../p/box5.scad>
use <../../p/stud4.scad>
use <../../p/stug-2x2.scad>
function ldraw_lib__s__3003s02() = [
// 0 ~Brick  2 x  2 without Front and Back Faces
// 0 Name: s\3003s02.dat
// 0 Author: Owen Burgoyne [C3POwen]
// 0 !LDRAW_ORG Subpart UPDATE 2013-02
// 0 !LICENSE Licensed under CC BY 2.0 and CC BY 4.0 : see CAreadme.txt
// 
// 0 BFC CERTIFY CCW
  [0,"BFC","CERTIFY"],
  [0,"BFC","CCW"],
// 
// 0 !HISTORY 2013-12-23 [PTadmin] Official Update 2013-02
// 
// 
// 1 16 0 4 0 1 0 0 0 -5 0 0 0 1 stud4.dat
  [1,16,0,4,0,1,0,0,0,-5,0,0,0,1, ldraw_lib__stud4()],
// 0 BFC INVERTNEXT
  [0,"BFC","INVERTNEXT"],
// 1 16 0 24 0 16 0 0 0 -20 0 0 0 16 box5.dat
  [1,16,0,24,0,16,0,0,0,-20,0,0,0,16, ldraw_lib__box5()],
// 4 16 20 24 20 16 24 16 -16 24 16 -20 24 20
  [4,16,20,24,20,16,24,16,-16,24,16,-20,24,20],
// 4 16 -20 24 20 -16 24 16 -16 24 -16 -20 24 -20
  [4,16,-20,24,20,-16,24,16,-16,24,-16,-20,24,-20],
// 4 16 -20 24 -20 -16 24 -16 16 24 -16 20 24 -20
  [4,16,-20,24,-20,-16,24,-16,16,24,-16,20,24,-20],
// 4 16 20 24 -20 16 24 -16 16 24 16 20 24 20
  [4,16,20,24,-20,16,24,-16,16,24,16,20,24,20],
// 2 24 20 24 20 -20 24 20
  [2,24,20,24,20,-20,24,20],
// 2 24 20 24 -20 -20 24 -20
  [2,24,20,24,-20,-20,24,-20],
// 1 16 0 24 0 0 0 20 0 -24 0 -20 0 0 box3u2p.dat
  [1,16,0,24,0,0,0,20,0,-24,0,-20,0,0, ldraw_lib__box3u2p()],
// 1 16 0 0 0 1 0 0 0 1 0 0 0 1 stug-2x2.dat
  [1,16,0,0,0,1,0,0,0,1,0,0,0,1, ldraw_lib__stug_2x2()],
];
module ldraw_lib__s__3003s02(step=0, col=false, unit=2/5, alt=false, line=0.2, solid=!$preview)
    makepoly(ldraw_lib__s__3003s02(), step=step, col=col, unit=unit, alt=alt, line=line, solid=solid);
ldraw_lib__s__3003s02(line=0.2);
// file: s/3003s01.scad
use <../../lib.scad>
use <3003s02.scad>
function ldraw_lib__s__3003s01() = [
// 0 ~Brick  2 x  2 without Front Face
// 0 Name: s\3003s01.dat
// 0 Author: Steffen [Steffen]
// 0 !LDRAW_ORG Subpart UPDATE 2013-02
// 0 !LICENSE Licensed under CC BY 4.0 : see CAreadme.txt
// 
// 0 BFC CERTIFY CCW
  [0,"BFC","CERTIFY"],
  [0,"BFC","CCW"],
// 
// 0 !HISTORY 2009-05-02 [PTadmin] Official Update 2009-01
// 0 !HISTORY 2013-04-02 [Steffen] used s\3003s02.dat
// 0 !HISTORY 2013-12-23 [PTadmin] Official Update 2013-02
// 
// 
// 1 16 0 0 0 1 0 0 0 1 0 0 0 1 s\3003s02.dat
  [1,16,0,0,0,1,0,0,0,1,0,0,0,1, ldraw_lib__s__3003s02()],
// 4 16 20 24 20 -20 24 20 -20 0 20 20 0 20
  [4,16,20,24,20,-20,24,20,-20,0,20,20,0,20],
];
module ldraw_lib__s__3003s01(step=0, col=false, unit=2/5, alt=false, line=0.2, solid=!$preview)
    makepoly(ldraw_lib__s__3003s01(), step=step, col=col, unit=unit, alt=alt, line=line, solid=solid);
ldraw_lib__s__3003s01(line=0.2);
// file: ../p/box5-12.scad
use <../lib.scad>
function ldraw_lib__box5_12() = [
// 0 Box with 5 Faces without Any Edges
// 0 Name: box5-12.dat
// 0 Author: Chris Dee [cwdee]
// 0 !LDRAW_ORG Primitive UPDATE 2009-02
// 0 !LICENSE Licensed under CC BY 2.0 and CC BY 4.0 : see CAreadme.txt
// 
// 0 BFC CERTIFY CCW
  [0,"BFC","CERTIFY"],
  [0,"BFC","CCW"],
// 
// 0 !HISTORY 2009-09-03 [PTadmin] Official Update 2009-02
// 
// 
// 4 16 1 1 1 1 1 -1 -1 1 -1 -1 1 1
  [4,16,1,1,1,1,1,-1,-1,1,-1,-1,1,1],
// 4 16 -1 0 1 1 0 1 1 1 1 -1 1 1
  [4,16,-1,0,1,1,0,1,1,1,1,-1,1,1],
// 4 16 -1 0 -1 -1 0 1 -1 1 1 -1 1 -1
  [4,16,-1,0,-1,-1,0,1,-1,1,1,-1,1,-1],
// 4 16 1 0 -1 -1 0 -1 -1 1 -1 1 1 -1
  [4,16,1,0,-1,-1,0,-1,-1,1,-1,1,1,-1],
// 4 16 1 0 1 1 0 -1 1 1 -1 1 1 1
  [4,16,1,0,1,1,0,-1,1,1,-1,1,1,1],
// 0
];
module ldraw_lib__box5_12(step=0, col=false, unit=2/5, alt=false, line=0.2, solid=!$preview)
    makepoly(ldraw_lib__box5_12(), step=step, col=col, unit=unit, alt=alt, line=line, solid=solid);
ldraw_lib__box5_12(line=0.2);
// file: 3003.scad
use <../lib.scad>
use <s/3003s01.scad>
$fa=1; $fs=0.2;
function ldraw_lib__3003(realsolid=false) = [
// 0 Brick  2 x  2
// 0 Name: 3003.dat
// 0 Author: James Jessiman
// 0 !LDRAW_ORG Part UPDATE 2022-05
// 0 !LICENSE Licensed under CC BY 2.0 and CC BY 4.0 : see CAreadme.txt
// 
// 0 BFC CERTIFY CCW
  [0,"BFC","CERTIFY"],
  [0,"BFC","CCW"],
// 
// 0 !HISTORY 2001-10-26 [PTadmin] Official Update 2001-01
// 0 !HISTORY 2002-05-07 {unknown} BFC Certification
// 0 !HISTORY 2002-06-11 [PTadmin] Official Update 2002-03
// 0 !HISTORY 2007-05-07 [PTadmin] Header formatted for Contributor Agreement
// 0 !HISTORY 2008-07-01 [PTadmin] Official Update 2008-01
// 0 !HISTORY 2022-08-04 [MagFors] Using subfile
// 0 !HISTORY 2022-09-15 [PTadmin] Official Update 2022-05
// 
// 
// 1 16 0 0 0 1 0 0 0 1 0 0 0 1 s\3003s01.dat
  [1,16,0,0,0,1,0,0,0,1,0,0,0,1, ldraw_lib__s__3003s01(realsolid)],
// 4 16 -20 24 -20 20 24 -20 20 0 -20 -20 0 -20
  [4,16,-20,24,-20,20,24,-20,20,0,-20,-20,0,-20],
];
module ldraw_lib__3003(step=0, col=false, unit=2/5, alt=false, line=0.2, solid=!$preview)
    makepoly(ldraw_lib__3003(solid), step=step, col=col, unit=unit, alt=alt, line=line, solid=solid);
ldraw_lib__3003(line=0.2);
// file: 194325c.scad
use <../lib.scad>
use <../p/box5-12.scad>
function ldraw_lib__194325c() = [
// 0 Sticker  1.1 x  1.9 with Black Drawer on Transparent Background
// 0 Name: 194325c.dat
// 0 Author: Takeshi Takahashi [RainbowDolphin]
// 0 !LDRAW_ORG Part UPDATE 2024-08
// 0 !LICENSE Licensed under CC BY 4.0 : see CAreadme.txt
// 
// 0 BFC CERTIFY CCW
  [0,"BFC","CERTIFY"],
  [0,"BFC","CCW"],
// 
// 0 !KEYWORDS Bedroom, Kitchen, oven, set 6372
// 
// 0 !HISTORY 2024-09-30 [OrionP] Official Update 2024-08
// 
// 
// 1 16 0 -0.25 0 19 0 0 0 0.25 0 0 0 11 box5-12.dat
  [1,16,0,-0.25,0,19,0,0,0,0.25,0,0,0,11, ldraw_lib__box5_12()],
// 0 BFC NOCLIP
  [0,"BFC","NOCLIP"],
// 4 0 -16 -0.25 -7 -16 -0.25 7 -16.5 -0.25 7.5 -16.5 -0.25 -7.5
  [4,0,-16,-0.25,-7,-16,-0.25,7,-16.5,-0.25,7.5,-16.5,-0.25,-7.5],
// 4 0 16 -0.25 -7 -16 -0.25 -7 -16.5 -0.25 -7.5 16.5 -0.25 -7.5
  [4,0,16,-0.25,-7,-16,-0.25,-7,-16.5,-0.25,-7.5,16.5,-0.25,-7.5],
// 4 0 16 -0.25 7 16 -0.25 -7 16.5 -0.25 -7.5 16.5 -0.25 7.5
  [4,0,16,-0.25,7,16,-0.25,-7,16.5,-0.25,-7.5,16.5,-0.25,7.5],
// 4 0 16 -0.25 7 16.5 -0.25 7.5 -16.5 -0.25 7.5 -16 -0.25 7
  [4,0,16,-0.25,7,16.5,-0.25,7.5,-16.5,-0.25,7.5,-16,-0.25,7],
// 4 0 6 -0.25 5 -6 -0.25 5 -6 -0.25 3.5 6 -0.25 3.5
  [4,0,6,-0.25,5,-6,-0.25,5,-6,-0.25,3.5,6,-0.25,3.5],
// 0 BFC CLIP
  [0,"BFC","CLIP"],
// 4 16 16.5 -0.25 7.5 19 -0.25 11 -19 -0.25 11 -16.5 -0.25 7.5
  [4,16,16.5,-0.25,7.5,19,-0.25,11,-19,-0.25,11,-16.5,-0.25,7.5],
// 4 16 -16.5 -0.25 -7.5 -16.5 -0.25 7.5 -19 -0.25 11 -19 -0.25 -11
  [4,16,-16.5,-0.25,-7.5,-16.5,-0.25,7.5,-19,-0.25,11,-19,-0.25,-11],
// 4 16 16.5 -0.25 -7.5 -16.5 -0.25 -7.5 -19 -0.25 -11 19 -0.25 -11
  [4,16,16.5,-0.25,-7.5,-16.5,-0.25,-7.5,-19,-0.25,-11,19,-0.25,-11],
// 4 16 16.5 -0.25 7.5 16.5 -0.25 -7.5 19 -0.25 -11 19 -0.25 11
  [4,16,16.5,-0.25,7.5,16.5,-0.25,-7.5,19,-0.25,-11,19,-0.25,11],
// 4 16 6 -0.25 5 16 -0.25 7 -16 -0.25 7 -6 -0.25 5
  [4,16,6,-0.25,5,16,-0.25,7,-16,-0.25,7,-6,-0.25,5],
// 4 16 -6 -0.25 3.5 -6 -0.25 5 -16 -0.25 7 -16 -0.25 -7
  [4,16,-6,-0.25,3.5,-6,-0.25,5,-16,-0.25,7,-16,-0.25,-7],
// 4 16 6 -0.25 3.5 -6 -0.25 3.5 -16 -0.25 -7 16 -0.25 -7
  [4,16,6,-0.25,3.5,-6,-0.25,3.5,-16,-0.25,-7,16,-0.25,-7],
// 4 16 6 -0.25 5 6 -0.25 3.5 16 -0.25 -7 16 -0.25 7
  [4,16,6,-0.25,5,6,-0.25,3.5,16,-0.25,-7,16,-0.25,7],
];
module ldraw_lib__194325c(step=0, col=false, unit=2/5, alt=false, line=0.2, solid=!$preview)
    makepoly(ldraw_lib__194325c(), step=step, col=col, unit=unit, alt=alt, line=line, solid=solid);
ldraw_lib__194325c(line=0.2);
// main file
use <../lib.scad>
use <194325c.scad>
use <3003.scad>
function ldraw_lib__3003d04() = [
// 0 Brick  2 x  2 with Black Drawer Sticker
// 0 Name: 3003d04.dat
// 0 Author: Takeshi Takahashi [RainbowDolphin]
// 0 !LDRAW_ORG Shortcut UPDATE 2024-08
// 0 !LICENSE Licensed under CC BY 4.0 : see CAreadme.txt
// 
// 0 BFC CERTIFY CCW
  [0,"BFC","CERTIFY"],
  [0,"BFC","CCW"],
// 
// 0 !CATEGORY Sticker Shortcut
// 0 !KEYWORDS Bedroom, Bricklink 3003pb018, set 6372, Town house
// 
// 0 !HISTORY 2024-09-30 [OrionP] Official Update 2024-08
// 
// 1 16 0 0 0 1 0 0 0 1 0 0 0 1 3003.dat
  [1,16,0,0,0,1,0,0,0,1,0,0,0,1, ldraw_lib__3003()],
// 1 16 0 12 -20 1 0 0 0 0 -1 0 1 0 194325c.dat
  [1,16,0,12,-20,1,0,0,0,0,-1,0,1,0, ldraw_lib__194325c()],
];
module ldraw_lib__3003d04(step=0, col=false, unit=2/5, alt=false, line=0.2, solid=!$preview)
    makepoly(ldraw_lib__3003d04(), step=step, col=col, unit=unit, alt=alt, line=line, solid=solid);
ldraw_lib__3003d04(line=0.2);
